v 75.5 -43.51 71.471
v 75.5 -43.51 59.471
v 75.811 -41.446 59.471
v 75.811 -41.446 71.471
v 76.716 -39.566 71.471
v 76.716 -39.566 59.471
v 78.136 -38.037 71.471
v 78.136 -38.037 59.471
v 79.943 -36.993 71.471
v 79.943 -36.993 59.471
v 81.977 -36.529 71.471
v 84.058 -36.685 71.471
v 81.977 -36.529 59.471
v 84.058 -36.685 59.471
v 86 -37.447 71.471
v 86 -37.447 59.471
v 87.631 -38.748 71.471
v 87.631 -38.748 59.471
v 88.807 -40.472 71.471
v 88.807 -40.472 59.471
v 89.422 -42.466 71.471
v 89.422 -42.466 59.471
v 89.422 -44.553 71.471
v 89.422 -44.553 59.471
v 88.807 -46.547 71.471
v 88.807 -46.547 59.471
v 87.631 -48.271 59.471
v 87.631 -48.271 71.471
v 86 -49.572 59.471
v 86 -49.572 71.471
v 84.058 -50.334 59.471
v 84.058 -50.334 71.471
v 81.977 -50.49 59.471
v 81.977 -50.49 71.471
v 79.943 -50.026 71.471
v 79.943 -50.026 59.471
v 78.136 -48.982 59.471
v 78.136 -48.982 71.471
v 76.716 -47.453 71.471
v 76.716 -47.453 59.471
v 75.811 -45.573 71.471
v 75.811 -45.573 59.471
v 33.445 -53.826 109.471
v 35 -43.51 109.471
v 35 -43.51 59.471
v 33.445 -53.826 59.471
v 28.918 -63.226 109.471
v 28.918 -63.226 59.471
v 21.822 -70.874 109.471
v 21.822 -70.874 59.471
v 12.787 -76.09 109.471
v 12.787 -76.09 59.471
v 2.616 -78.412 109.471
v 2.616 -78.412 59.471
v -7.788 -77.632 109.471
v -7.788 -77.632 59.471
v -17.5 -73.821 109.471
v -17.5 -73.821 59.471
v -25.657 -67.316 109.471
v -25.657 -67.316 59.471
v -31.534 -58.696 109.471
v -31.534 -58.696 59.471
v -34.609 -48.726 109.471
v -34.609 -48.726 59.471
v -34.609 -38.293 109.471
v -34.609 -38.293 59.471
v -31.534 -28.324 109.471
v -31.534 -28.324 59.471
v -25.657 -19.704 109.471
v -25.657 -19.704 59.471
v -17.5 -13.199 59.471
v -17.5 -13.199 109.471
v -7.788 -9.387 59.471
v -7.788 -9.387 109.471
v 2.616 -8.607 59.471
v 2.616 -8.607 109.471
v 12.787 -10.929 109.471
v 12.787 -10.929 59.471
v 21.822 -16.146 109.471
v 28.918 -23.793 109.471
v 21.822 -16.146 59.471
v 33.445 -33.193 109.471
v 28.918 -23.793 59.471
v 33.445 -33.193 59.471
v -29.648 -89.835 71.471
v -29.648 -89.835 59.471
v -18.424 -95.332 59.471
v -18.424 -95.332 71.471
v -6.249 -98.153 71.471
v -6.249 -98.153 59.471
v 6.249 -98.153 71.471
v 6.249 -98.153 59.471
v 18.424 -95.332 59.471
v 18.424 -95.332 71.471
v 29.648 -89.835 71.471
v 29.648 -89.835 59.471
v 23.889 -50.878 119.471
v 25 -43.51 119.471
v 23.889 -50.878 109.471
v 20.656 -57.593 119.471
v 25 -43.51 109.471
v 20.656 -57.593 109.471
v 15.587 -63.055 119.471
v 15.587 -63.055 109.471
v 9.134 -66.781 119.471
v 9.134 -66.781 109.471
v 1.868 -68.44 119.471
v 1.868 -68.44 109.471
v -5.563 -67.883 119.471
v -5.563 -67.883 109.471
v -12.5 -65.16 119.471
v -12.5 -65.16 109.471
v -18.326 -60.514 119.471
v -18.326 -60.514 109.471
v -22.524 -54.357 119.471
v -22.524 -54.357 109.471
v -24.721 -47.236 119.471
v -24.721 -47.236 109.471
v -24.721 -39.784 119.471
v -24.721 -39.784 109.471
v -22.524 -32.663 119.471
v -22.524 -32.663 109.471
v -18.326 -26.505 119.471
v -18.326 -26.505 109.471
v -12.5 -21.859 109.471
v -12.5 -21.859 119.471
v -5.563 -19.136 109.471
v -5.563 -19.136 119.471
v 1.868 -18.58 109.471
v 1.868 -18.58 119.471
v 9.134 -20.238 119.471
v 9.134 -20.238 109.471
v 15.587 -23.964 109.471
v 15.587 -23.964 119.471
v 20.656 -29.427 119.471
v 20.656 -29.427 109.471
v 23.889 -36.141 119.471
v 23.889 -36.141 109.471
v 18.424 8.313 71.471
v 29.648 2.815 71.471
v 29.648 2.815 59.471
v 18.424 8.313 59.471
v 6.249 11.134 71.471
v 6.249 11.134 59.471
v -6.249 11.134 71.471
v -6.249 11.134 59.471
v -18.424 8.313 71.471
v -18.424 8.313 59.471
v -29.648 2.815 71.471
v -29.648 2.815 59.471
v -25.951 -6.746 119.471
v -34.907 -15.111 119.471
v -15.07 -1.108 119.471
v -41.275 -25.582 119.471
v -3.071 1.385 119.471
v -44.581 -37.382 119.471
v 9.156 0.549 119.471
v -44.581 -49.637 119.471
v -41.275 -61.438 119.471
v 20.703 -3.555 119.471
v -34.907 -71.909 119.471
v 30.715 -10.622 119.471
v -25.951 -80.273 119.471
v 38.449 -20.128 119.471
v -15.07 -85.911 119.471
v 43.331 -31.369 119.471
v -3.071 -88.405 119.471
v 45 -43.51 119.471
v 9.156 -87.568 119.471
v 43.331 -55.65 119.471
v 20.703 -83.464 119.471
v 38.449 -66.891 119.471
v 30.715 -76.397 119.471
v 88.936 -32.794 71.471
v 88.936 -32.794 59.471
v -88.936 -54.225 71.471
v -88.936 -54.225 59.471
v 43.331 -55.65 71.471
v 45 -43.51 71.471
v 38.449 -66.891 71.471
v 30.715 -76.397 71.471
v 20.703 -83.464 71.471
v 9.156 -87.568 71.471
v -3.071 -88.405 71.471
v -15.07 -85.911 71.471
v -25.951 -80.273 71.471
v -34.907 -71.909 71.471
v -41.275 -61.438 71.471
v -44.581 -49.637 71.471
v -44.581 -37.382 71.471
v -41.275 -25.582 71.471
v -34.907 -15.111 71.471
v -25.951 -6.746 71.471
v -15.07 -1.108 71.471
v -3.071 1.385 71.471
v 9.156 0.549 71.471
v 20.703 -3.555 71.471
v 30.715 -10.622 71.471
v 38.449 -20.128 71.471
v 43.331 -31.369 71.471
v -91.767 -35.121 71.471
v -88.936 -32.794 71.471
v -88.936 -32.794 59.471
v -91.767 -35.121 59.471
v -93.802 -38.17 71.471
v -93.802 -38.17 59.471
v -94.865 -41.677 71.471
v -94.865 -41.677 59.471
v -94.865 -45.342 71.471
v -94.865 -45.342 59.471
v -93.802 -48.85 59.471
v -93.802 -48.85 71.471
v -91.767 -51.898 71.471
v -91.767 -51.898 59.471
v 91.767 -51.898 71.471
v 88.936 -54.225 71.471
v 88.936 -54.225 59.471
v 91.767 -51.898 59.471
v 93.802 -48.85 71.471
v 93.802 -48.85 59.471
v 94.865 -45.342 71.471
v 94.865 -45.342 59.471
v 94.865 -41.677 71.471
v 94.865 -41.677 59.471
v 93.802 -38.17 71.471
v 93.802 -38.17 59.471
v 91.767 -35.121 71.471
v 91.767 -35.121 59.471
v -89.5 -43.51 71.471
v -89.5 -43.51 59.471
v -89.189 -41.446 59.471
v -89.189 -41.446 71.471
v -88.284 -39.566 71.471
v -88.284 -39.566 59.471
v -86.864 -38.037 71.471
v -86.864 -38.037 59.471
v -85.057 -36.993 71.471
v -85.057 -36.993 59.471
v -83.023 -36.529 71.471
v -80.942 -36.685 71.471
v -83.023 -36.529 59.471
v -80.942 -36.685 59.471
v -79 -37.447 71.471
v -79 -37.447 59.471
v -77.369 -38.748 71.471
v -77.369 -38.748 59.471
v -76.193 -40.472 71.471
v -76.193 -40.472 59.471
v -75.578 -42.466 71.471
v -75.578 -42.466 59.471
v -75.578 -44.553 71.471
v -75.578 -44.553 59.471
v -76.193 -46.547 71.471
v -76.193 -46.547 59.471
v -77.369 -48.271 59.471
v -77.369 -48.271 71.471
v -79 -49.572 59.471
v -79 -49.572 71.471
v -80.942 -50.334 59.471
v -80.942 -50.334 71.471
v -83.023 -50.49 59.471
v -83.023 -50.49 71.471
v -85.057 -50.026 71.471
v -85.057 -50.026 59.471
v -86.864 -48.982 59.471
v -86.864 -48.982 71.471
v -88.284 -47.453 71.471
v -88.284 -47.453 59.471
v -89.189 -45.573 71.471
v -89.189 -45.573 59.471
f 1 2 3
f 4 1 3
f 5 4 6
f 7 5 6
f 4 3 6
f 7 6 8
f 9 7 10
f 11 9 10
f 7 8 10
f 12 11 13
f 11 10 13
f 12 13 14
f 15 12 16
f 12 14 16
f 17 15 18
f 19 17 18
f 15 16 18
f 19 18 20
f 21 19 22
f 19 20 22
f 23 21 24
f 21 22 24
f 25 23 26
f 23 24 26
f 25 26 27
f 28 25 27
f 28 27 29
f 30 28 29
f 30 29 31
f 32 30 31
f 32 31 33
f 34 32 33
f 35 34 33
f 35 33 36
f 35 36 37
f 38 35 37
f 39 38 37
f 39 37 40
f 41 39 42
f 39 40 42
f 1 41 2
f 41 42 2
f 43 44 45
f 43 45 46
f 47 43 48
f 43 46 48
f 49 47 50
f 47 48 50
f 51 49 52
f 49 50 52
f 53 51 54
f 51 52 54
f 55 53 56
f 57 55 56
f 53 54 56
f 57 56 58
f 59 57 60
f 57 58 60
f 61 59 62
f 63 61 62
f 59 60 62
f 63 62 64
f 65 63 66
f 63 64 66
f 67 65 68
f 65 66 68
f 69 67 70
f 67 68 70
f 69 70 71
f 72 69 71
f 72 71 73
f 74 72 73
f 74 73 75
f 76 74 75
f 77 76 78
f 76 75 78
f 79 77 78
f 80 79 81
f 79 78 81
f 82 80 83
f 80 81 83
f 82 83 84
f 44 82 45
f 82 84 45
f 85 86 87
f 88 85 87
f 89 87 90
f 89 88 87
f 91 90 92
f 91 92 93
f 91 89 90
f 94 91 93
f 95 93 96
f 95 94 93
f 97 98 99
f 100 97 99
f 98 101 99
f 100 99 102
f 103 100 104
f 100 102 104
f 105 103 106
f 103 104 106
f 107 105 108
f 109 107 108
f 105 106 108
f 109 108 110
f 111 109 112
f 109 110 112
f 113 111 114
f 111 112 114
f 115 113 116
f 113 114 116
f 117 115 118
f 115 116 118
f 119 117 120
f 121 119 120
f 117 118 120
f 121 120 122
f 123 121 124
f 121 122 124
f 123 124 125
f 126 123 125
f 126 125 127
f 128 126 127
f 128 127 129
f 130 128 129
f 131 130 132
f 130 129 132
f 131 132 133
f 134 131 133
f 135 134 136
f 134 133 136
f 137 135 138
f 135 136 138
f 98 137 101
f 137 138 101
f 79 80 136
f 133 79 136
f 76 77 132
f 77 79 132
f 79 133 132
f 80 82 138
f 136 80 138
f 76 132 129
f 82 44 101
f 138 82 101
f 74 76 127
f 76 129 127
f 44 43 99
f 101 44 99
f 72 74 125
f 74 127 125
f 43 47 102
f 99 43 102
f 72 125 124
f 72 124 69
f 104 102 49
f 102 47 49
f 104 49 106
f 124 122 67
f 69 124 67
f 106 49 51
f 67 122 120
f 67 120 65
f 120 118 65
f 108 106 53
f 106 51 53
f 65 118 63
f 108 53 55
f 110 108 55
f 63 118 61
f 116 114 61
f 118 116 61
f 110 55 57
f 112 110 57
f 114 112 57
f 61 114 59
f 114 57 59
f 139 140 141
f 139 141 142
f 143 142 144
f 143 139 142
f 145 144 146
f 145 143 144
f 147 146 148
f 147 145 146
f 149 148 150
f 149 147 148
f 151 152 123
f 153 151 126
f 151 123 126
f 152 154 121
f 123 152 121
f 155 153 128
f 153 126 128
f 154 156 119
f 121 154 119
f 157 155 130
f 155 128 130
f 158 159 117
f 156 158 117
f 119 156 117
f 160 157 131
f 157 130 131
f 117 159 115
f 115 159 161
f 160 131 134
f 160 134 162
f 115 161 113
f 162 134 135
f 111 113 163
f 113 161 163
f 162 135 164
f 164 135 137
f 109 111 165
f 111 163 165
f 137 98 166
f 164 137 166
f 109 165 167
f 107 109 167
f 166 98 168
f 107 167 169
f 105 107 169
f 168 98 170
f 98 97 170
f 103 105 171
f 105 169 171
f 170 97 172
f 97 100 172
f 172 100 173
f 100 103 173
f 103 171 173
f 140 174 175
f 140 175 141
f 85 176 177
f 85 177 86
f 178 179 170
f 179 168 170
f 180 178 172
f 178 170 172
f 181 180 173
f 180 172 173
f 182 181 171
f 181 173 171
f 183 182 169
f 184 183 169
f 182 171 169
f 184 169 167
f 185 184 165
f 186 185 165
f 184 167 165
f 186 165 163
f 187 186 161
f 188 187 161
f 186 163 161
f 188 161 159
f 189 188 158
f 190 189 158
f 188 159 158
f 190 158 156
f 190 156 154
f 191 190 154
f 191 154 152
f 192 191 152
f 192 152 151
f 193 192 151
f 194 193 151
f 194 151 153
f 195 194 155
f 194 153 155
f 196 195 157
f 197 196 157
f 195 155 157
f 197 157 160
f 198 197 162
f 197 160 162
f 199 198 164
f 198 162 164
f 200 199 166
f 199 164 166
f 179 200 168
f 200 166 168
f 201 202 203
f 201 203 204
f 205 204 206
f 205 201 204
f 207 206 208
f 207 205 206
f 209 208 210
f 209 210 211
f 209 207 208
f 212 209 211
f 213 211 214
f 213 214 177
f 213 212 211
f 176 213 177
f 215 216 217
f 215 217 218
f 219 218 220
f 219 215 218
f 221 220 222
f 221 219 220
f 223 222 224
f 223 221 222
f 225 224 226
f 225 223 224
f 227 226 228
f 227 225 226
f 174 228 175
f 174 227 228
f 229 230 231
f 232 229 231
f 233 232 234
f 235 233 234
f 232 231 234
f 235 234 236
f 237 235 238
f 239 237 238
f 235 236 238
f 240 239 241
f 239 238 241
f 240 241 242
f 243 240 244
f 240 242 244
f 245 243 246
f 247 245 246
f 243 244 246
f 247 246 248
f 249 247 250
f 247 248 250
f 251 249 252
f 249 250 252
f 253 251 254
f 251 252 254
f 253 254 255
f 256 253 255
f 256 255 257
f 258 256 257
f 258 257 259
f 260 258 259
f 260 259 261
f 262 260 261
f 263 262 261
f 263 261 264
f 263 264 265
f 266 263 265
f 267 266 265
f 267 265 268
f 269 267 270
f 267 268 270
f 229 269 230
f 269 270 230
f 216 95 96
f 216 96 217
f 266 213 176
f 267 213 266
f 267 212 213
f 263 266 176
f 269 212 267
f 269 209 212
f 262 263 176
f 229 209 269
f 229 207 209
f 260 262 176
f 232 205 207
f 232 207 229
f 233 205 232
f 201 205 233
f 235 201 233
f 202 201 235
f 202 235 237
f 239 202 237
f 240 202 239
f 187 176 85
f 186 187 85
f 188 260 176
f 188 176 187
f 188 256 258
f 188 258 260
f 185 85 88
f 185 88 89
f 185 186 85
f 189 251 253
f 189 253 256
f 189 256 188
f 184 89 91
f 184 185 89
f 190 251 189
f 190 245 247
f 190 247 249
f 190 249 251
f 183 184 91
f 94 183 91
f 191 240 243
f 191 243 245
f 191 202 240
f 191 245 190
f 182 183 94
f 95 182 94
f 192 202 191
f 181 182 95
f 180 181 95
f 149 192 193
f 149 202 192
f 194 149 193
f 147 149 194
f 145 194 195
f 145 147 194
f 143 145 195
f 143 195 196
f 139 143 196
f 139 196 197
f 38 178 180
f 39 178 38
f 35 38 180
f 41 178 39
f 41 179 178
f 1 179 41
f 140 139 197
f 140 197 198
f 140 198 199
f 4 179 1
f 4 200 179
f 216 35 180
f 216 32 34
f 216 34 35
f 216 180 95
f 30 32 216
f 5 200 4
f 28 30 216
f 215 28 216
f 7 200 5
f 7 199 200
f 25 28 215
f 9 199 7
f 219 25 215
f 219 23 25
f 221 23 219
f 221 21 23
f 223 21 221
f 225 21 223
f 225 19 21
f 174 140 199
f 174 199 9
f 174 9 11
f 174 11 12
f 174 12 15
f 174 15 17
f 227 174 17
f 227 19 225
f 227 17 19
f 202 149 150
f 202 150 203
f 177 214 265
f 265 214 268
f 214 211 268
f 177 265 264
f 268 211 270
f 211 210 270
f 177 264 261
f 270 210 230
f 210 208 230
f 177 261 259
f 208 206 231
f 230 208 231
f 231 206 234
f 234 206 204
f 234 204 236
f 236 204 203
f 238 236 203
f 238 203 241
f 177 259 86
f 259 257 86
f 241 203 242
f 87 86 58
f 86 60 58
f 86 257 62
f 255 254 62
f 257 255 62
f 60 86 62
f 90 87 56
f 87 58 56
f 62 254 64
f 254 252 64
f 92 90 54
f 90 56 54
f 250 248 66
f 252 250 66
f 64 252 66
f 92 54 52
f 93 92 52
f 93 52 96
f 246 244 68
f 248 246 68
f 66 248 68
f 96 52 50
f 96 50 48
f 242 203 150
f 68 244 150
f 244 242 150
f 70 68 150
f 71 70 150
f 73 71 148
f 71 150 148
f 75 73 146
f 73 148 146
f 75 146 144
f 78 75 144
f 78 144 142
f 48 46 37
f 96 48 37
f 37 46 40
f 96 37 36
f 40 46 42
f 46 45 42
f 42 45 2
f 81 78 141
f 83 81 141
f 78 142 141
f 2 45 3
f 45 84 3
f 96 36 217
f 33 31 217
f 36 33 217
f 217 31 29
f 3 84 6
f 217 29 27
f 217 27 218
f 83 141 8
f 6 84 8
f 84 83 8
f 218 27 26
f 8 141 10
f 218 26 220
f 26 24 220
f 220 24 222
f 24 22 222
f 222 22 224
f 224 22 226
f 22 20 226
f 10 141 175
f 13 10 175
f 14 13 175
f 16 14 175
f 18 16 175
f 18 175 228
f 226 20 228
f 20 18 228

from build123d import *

# Parameters (mm, degrees)
BOSS_EXTRUDE1_START = -12
SKETCH3_R           = 45
BOSS_EXTRUDE1_DEPTH = 12
SKETCH4_R           = 7
CUT_EXTRUDE1_DEPTH  = 12


with BuildPart() as part:
    # Sketch1 → Revolve2 (revolve)
    with BuildSketch(Plane(origin=(0, 0, 0), x_dir=(0, 0, -1), z_dir=(1, 0, 0)), mode=Mode.PRIVATE) as revolve2_sk:
        Polygon((-109.471153846, -8.509615385), (-59.471153846, -8.509615385), (-59.471153846, 1.490384615), (-119.471153846, 1.490384615), (-119.471153846, -18.509615385), (-109.471153846, -18.509615385), align=None)
    revolve(revolve2_sk.sketch.rotate(Axis((0, -43.509615385, 119.471153846), (0, 0, -1)), 90), axis=Axis((0, -43.509615385, 119.471153846), (0, 0, -1)))

    # Sketch3 → Boss-Extrude1 (add)
    with BuildSketch(Plane(origin=(0, 0, 59.471153846), x_dir=(-1, 0, 0), z_dir=(0, 0, -1)).offset(BOSS_EXTRUDE1_START)):
        with BuildLine():
            Line((-29.647715243, -89.834694778), (-88.936024476, -54.225378957))
            ThreePointArc((-88.936024476, -54.225378957), (-95, -43.509615385), (-88.936024476, -32.793851812))
            Line((-88.936024476, -32.793851812), (-29.647715243, 2.815464009))
            ThreePointArc((-29.647715243, 2.815464009), (0, 11.490384615), (29.647715243, 2.815464009))
            Line((29.647715243, 2.815464009), (88.936024476, -32.793851812))
            ThreePointArc((88.936024476, -32.793851812), (95, -43.509615385), (88.936024476, -54.225378958))
            Line((88.936024476, -54.225378958), (29.647715243, -89.834694778))
            ThreePointArc((29.647715243, -89.834694778), (0, -98.509615385), (-29.647715243, -89.834694778))
        make_face()
        with Locations(Location((0, -43.509615385, 0), (0, 0, 180))):
            Circle(SKETCH3_R, mode=Mode.SUBTRACT)
    extrude(amount=BOSS_EXTRUDE1_DEPTH)

    # Sketch4 → Cut-Extrude1 (cut)
    with BuildSketch(Plane(origin=(0, 0, 59.471153846), x_dir=(-1, 0, 0), z_dir=(0, 0, -1))):
        with Locations((-82.5, -43.509615385)):
            Circle(SKETCH4_R)
        with Locations((82.5, -43.509615385)):
            Circle(SKETCH4_R)
    extrude(amount=-CUT_EXTRUDE1_DEPTH, mode=Mode.SUBTRACT)


solid = part.part
